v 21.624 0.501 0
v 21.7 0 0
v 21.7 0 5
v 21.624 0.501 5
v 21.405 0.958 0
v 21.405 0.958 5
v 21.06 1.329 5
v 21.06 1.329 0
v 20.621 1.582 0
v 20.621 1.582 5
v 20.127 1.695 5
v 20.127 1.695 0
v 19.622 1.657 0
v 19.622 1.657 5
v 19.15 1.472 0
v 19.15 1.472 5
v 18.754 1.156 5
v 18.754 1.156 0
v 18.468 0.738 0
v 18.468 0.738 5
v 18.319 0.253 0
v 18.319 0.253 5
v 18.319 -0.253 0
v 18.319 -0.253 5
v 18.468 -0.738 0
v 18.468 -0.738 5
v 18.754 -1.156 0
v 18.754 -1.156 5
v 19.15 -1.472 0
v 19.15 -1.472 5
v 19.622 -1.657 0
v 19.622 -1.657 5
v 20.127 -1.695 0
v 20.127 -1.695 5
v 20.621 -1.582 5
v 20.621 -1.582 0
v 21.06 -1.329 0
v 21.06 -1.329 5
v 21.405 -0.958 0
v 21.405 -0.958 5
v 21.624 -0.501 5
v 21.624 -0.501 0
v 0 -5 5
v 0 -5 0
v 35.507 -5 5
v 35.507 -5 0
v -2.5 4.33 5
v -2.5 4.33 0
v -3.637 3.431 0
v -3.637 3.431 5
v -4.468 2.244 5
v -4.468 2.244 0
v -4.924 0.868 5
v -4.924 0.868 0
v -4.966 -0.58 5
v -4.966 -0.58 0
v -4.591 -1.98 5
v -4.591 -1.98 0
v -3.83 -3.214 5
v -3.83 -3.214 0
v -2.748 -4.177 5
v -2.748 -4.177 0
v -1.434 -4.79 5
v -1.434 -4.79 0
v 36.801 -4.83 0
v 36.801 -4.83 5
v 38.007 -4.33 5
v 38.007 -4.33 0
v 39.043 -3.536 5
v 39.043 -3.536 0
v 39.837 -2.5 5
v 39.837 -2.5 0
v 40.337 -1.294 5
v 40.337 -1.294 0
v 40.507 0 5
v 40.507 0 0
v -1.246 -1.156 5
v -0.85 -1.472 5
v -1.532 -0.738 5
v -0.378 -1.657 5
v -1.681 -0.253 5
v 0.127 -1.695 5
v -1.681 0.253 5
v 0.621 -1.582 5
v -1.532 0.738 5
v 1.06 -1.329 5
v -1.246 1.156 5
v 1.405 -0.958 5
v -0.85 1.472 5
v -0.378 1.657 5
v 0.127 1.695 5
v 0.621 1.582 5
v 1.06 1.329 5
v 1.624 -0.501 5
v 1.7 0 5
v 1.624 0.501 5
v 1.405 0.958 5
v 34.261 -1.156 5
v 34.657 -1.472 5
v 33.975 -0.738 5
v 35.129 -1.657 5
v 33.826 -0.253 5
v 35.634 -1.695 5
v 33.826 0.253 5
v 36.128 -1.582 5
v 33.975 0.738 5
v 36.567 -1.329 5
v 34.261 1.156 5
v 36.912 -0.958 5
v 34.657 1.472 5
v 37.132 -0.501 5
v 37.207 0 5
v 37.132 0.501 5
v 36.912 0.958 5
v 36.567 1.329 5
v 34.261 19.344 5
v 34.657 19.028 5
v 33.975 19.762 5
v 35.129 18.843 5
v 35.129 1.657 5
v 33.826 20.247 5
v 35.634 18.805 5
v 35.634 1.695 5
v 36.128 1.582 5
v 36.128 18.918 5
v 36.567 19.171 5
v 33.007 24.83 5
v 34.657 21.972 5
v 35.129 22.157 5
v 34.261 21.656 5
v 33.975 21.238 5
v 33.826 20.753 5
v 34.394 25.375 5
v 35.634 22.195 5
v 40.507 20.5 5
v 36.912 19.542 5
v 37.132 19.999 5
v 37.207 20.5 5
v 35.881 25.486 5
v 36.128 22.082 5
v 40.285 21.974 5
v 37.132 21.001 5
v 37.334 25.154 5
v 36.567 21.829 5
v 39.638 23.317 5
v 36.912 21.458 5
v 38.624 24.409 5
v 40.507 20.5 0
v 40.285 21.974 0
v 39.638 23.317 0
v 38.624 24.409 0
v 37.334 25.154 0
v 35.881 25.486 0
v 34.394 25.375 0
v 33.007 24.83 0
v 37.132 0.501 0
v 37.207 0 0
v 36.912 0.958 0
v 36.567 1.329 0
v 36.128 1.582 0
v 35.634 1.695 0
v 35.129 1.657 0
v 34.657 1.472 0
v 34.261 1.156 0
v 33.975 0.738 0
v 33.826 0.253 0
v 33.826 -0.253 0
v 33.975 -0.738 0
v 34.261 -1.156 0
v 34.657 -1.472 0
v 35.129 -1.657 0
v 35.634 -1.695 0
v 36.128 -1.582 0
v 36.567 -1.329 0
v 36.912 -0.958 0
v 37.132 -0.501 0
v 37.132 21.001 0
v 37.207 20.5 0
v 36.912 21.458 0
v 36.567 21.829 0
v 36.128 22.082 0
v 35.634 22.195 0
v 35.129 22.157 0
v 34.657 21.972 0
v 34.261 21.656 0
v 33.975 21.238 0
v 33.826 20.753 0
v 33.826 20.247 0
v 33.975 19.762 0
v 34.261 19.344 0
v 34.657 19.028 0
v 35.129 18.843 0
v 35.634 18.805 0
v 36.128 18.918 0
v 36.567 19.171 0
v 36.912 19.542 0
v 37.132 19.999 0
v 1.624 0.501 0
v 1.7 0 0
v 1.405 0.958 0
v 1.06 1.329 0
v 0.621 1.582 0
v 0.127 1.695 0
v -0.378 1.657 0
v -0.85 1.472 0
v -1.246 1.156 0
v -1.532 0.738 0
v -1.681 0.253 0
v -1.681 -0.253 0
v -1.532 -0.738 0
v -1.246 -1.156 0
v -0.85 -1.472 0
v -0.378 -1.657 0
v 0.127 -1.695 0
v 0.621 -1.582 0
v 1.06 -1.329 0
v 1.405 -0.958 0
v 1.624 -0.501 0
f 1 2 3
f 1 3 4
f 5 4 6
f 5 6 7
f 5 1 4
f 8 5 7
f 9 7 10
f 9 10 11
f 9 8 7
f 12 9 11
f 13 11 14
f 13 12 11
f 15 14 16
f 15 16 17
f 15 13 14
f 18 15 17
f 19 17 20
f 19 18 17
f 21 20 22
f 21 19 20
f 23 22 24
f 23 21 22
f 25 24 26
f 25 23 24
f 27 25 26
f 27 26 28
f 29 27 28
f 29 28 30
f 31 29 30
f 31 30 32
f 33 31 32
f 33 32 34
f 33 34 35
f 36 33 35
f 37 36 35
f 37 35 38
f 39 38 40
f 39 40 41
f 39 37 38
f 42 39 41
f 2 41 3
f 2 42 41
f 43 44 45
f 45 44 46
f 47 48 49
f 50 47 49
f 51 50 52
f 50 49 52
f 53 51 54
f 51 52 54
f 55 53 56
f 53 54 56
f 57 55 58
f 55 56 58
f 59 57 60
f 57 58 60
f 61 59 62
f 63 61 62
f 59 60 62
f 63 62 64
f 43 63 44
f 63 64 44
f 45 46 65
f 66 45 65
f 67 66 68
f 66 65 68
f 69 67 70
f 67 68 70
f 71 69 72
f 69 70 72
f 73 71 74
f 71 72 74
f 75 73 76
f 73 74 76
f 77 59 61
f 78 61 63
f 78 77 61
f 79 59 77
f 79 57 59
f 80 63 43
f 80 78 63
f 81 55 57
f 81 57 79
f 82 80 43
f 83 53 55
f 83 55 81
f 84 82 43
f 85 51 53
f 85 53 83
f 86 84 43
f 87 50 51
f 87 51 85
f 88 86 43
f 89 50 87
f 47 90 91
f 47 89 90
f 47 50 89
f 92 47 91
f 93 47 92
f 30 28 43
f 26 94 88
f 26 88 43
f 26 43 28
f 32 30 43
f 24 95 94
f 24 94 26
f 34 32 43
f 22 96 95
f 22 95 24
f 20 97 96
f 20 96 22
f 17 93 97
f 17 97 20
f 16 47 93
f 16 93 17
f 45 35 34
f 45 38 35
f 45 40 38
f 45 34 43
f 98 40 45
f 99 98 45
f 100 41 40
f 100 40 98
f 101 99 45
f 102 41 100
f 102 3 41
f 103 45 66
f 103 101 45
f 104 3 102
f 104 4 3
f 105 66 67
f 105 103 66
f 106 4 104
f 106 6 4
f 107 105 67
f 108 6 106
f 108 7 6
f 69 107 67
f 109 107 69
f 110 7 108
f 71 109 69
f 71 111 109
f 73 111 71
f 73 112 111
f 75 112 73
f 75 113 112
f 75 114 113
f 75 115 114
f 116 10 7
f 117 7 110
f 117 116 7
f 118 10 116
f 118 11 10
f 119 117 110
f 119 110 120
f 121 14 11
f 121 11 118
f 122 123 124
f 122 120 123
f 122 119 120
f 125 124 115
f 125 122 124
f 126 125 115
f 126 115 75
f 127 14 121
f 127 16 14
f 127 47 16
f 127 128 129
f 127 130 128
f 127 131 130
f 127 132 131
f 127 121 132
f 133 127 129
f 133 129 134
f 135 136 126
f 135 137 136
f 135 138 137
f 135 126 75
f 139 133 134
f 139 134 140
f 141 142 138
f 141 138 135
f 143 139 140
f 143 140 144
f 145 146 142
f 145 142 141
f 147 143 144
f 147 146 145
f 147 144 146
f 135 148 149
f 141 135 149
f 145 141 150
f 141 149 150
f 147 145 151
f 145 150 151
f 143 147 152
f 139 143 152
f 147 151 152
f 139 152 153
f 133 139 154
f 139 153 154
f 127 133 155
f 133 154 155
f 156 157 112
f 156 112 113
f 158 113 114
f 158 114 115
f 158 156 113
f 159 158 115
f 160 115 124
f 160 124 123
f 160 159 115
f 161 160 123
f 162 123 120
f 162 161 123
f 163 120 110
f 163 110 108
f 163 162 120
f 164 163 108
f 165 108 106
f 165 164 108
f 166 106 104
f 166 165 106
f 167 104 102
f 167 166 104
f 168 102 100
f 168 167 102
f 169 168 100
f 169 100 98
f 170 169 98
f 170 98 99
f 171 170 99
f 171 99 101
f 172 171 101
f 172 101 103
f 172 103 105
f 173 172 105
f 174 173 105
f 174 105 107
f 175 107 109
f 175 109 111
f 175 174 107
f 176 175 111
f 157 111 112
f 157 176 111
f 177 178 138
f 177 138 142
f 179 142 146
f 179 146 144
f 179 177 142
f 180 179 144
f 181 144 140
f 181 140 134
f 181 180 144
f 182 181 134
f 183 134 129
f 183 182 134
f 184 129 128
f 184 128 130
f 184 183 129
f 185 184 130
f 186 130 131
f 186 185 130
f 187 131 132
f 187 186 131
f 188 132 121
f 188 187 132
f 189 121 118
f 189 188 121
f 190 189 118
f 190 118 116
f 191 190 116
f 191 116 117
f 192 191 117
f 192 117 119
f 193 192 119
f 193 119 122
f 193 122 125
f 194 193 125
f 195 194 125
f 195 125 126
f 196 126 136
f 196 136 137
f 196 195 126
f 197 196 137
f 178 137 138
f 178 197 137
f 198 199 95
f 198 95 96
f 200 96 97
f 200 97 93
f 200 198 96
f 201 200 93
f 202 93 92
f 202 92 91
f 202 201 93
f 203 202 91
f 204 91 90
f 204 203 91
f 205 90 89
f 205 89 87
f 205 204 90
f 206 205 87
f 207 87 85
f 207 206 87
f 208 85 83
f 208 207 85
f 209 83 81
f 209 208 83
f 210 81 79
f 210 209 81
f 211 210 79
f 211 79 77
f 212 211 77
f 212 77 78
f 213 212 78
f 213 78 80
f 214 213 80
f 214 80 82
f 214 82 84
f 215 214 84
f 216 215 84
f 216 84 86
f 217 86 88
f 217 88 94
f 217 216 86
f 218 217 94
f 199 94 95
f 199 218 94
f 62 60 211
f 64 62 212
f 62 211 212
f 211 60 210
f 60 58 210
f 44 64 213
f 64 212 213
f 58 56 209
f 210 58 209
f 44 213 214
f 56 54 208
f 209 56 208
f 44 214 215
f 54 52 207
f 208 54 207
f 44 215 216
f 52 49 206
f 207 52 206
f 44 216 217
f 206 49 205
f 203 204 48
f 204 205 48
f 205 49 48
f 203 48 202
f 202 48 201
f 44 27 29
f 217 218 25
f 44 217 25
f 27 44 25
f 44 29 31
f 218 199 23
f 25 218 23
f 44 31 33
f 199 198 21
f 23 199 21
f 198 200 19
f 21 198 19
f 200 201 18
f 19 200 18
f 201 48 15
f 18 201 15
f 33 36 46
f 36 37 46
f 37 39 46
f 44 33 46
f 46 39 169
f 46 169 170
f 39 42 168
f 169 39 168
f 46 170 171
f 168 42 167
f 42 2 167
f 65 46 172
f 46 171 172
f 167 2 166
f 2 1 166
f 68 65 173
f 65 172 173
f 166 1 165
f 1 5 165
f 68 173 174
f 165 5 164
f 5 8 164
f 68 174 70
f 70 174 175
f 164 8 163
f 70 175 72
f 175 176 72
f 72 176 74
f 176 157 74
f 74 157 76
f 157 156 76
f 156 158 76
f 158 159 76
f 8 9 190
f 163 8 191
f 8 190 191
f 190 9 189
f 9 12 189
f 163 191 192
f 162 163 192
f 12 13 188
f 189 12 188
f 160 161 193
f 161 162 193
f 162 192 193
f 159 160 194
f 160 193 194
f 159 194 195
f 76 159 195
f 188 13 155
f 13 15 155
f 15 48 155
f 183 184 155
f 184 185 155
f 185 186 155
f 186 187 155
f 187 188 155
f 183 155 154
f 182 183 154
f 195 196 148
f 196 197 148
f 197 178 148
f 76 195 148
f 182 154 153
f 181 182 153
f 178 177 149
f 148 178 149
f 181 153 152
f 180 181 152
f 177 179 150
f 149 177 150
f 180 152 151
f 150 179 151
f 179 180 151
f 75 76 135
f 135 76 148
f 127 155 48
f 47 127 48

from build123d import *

# Parameters (mm, degrees)
SKETCH_1_R      = 1.7
EXTRUDE_1_DEPTH = 5


with BuildPart() as part:
    # ｽｹｯﾁ1 → ﾎﾞｽ - 押し出し1 (new body)
    with BuildSketch(Plane.XY):
        with BuildLine():
            ThreePointArc((35.507041555, -5), (39.042575461, -3.535533906), (40.507041555, 0))
            Line((40.507041555, 0), (40.507041555, 20.5))
            ThreePointArc((40.507041555, 20.5), (38.007041622, 24.830126981), (33.007041688, 24.830127096))
            Line((33.007041688, 24.830127096), (-2.50000007, 4.330126978))
            ThreePointArc((-2.50000007, 4.330126978), (-4.829629126, -1.294095246), (-3.8e-08, -5))
            Line((-3.8e-08, -5), (35.507041555, -5))
        make_face()
        Circle(SKETCH_1_R, mode=Mode.SUBTRACT)
        with Locations((20, 0)):
            Circle(SKETCH_1_R, mode=Mode.SUBTRACT)
        with Locations((35.507041555, 0)):
            Circle(SKETCH_1_R, mode=Mode.SUBTRACT)
        with Locations((35.507041555, 20.5)):
            Circle(SKETCH_1_R, mode=Mode.SUBTRACT)
    extrude(amount=EXTRUDE_1_DEPTH)


solid = part.part
